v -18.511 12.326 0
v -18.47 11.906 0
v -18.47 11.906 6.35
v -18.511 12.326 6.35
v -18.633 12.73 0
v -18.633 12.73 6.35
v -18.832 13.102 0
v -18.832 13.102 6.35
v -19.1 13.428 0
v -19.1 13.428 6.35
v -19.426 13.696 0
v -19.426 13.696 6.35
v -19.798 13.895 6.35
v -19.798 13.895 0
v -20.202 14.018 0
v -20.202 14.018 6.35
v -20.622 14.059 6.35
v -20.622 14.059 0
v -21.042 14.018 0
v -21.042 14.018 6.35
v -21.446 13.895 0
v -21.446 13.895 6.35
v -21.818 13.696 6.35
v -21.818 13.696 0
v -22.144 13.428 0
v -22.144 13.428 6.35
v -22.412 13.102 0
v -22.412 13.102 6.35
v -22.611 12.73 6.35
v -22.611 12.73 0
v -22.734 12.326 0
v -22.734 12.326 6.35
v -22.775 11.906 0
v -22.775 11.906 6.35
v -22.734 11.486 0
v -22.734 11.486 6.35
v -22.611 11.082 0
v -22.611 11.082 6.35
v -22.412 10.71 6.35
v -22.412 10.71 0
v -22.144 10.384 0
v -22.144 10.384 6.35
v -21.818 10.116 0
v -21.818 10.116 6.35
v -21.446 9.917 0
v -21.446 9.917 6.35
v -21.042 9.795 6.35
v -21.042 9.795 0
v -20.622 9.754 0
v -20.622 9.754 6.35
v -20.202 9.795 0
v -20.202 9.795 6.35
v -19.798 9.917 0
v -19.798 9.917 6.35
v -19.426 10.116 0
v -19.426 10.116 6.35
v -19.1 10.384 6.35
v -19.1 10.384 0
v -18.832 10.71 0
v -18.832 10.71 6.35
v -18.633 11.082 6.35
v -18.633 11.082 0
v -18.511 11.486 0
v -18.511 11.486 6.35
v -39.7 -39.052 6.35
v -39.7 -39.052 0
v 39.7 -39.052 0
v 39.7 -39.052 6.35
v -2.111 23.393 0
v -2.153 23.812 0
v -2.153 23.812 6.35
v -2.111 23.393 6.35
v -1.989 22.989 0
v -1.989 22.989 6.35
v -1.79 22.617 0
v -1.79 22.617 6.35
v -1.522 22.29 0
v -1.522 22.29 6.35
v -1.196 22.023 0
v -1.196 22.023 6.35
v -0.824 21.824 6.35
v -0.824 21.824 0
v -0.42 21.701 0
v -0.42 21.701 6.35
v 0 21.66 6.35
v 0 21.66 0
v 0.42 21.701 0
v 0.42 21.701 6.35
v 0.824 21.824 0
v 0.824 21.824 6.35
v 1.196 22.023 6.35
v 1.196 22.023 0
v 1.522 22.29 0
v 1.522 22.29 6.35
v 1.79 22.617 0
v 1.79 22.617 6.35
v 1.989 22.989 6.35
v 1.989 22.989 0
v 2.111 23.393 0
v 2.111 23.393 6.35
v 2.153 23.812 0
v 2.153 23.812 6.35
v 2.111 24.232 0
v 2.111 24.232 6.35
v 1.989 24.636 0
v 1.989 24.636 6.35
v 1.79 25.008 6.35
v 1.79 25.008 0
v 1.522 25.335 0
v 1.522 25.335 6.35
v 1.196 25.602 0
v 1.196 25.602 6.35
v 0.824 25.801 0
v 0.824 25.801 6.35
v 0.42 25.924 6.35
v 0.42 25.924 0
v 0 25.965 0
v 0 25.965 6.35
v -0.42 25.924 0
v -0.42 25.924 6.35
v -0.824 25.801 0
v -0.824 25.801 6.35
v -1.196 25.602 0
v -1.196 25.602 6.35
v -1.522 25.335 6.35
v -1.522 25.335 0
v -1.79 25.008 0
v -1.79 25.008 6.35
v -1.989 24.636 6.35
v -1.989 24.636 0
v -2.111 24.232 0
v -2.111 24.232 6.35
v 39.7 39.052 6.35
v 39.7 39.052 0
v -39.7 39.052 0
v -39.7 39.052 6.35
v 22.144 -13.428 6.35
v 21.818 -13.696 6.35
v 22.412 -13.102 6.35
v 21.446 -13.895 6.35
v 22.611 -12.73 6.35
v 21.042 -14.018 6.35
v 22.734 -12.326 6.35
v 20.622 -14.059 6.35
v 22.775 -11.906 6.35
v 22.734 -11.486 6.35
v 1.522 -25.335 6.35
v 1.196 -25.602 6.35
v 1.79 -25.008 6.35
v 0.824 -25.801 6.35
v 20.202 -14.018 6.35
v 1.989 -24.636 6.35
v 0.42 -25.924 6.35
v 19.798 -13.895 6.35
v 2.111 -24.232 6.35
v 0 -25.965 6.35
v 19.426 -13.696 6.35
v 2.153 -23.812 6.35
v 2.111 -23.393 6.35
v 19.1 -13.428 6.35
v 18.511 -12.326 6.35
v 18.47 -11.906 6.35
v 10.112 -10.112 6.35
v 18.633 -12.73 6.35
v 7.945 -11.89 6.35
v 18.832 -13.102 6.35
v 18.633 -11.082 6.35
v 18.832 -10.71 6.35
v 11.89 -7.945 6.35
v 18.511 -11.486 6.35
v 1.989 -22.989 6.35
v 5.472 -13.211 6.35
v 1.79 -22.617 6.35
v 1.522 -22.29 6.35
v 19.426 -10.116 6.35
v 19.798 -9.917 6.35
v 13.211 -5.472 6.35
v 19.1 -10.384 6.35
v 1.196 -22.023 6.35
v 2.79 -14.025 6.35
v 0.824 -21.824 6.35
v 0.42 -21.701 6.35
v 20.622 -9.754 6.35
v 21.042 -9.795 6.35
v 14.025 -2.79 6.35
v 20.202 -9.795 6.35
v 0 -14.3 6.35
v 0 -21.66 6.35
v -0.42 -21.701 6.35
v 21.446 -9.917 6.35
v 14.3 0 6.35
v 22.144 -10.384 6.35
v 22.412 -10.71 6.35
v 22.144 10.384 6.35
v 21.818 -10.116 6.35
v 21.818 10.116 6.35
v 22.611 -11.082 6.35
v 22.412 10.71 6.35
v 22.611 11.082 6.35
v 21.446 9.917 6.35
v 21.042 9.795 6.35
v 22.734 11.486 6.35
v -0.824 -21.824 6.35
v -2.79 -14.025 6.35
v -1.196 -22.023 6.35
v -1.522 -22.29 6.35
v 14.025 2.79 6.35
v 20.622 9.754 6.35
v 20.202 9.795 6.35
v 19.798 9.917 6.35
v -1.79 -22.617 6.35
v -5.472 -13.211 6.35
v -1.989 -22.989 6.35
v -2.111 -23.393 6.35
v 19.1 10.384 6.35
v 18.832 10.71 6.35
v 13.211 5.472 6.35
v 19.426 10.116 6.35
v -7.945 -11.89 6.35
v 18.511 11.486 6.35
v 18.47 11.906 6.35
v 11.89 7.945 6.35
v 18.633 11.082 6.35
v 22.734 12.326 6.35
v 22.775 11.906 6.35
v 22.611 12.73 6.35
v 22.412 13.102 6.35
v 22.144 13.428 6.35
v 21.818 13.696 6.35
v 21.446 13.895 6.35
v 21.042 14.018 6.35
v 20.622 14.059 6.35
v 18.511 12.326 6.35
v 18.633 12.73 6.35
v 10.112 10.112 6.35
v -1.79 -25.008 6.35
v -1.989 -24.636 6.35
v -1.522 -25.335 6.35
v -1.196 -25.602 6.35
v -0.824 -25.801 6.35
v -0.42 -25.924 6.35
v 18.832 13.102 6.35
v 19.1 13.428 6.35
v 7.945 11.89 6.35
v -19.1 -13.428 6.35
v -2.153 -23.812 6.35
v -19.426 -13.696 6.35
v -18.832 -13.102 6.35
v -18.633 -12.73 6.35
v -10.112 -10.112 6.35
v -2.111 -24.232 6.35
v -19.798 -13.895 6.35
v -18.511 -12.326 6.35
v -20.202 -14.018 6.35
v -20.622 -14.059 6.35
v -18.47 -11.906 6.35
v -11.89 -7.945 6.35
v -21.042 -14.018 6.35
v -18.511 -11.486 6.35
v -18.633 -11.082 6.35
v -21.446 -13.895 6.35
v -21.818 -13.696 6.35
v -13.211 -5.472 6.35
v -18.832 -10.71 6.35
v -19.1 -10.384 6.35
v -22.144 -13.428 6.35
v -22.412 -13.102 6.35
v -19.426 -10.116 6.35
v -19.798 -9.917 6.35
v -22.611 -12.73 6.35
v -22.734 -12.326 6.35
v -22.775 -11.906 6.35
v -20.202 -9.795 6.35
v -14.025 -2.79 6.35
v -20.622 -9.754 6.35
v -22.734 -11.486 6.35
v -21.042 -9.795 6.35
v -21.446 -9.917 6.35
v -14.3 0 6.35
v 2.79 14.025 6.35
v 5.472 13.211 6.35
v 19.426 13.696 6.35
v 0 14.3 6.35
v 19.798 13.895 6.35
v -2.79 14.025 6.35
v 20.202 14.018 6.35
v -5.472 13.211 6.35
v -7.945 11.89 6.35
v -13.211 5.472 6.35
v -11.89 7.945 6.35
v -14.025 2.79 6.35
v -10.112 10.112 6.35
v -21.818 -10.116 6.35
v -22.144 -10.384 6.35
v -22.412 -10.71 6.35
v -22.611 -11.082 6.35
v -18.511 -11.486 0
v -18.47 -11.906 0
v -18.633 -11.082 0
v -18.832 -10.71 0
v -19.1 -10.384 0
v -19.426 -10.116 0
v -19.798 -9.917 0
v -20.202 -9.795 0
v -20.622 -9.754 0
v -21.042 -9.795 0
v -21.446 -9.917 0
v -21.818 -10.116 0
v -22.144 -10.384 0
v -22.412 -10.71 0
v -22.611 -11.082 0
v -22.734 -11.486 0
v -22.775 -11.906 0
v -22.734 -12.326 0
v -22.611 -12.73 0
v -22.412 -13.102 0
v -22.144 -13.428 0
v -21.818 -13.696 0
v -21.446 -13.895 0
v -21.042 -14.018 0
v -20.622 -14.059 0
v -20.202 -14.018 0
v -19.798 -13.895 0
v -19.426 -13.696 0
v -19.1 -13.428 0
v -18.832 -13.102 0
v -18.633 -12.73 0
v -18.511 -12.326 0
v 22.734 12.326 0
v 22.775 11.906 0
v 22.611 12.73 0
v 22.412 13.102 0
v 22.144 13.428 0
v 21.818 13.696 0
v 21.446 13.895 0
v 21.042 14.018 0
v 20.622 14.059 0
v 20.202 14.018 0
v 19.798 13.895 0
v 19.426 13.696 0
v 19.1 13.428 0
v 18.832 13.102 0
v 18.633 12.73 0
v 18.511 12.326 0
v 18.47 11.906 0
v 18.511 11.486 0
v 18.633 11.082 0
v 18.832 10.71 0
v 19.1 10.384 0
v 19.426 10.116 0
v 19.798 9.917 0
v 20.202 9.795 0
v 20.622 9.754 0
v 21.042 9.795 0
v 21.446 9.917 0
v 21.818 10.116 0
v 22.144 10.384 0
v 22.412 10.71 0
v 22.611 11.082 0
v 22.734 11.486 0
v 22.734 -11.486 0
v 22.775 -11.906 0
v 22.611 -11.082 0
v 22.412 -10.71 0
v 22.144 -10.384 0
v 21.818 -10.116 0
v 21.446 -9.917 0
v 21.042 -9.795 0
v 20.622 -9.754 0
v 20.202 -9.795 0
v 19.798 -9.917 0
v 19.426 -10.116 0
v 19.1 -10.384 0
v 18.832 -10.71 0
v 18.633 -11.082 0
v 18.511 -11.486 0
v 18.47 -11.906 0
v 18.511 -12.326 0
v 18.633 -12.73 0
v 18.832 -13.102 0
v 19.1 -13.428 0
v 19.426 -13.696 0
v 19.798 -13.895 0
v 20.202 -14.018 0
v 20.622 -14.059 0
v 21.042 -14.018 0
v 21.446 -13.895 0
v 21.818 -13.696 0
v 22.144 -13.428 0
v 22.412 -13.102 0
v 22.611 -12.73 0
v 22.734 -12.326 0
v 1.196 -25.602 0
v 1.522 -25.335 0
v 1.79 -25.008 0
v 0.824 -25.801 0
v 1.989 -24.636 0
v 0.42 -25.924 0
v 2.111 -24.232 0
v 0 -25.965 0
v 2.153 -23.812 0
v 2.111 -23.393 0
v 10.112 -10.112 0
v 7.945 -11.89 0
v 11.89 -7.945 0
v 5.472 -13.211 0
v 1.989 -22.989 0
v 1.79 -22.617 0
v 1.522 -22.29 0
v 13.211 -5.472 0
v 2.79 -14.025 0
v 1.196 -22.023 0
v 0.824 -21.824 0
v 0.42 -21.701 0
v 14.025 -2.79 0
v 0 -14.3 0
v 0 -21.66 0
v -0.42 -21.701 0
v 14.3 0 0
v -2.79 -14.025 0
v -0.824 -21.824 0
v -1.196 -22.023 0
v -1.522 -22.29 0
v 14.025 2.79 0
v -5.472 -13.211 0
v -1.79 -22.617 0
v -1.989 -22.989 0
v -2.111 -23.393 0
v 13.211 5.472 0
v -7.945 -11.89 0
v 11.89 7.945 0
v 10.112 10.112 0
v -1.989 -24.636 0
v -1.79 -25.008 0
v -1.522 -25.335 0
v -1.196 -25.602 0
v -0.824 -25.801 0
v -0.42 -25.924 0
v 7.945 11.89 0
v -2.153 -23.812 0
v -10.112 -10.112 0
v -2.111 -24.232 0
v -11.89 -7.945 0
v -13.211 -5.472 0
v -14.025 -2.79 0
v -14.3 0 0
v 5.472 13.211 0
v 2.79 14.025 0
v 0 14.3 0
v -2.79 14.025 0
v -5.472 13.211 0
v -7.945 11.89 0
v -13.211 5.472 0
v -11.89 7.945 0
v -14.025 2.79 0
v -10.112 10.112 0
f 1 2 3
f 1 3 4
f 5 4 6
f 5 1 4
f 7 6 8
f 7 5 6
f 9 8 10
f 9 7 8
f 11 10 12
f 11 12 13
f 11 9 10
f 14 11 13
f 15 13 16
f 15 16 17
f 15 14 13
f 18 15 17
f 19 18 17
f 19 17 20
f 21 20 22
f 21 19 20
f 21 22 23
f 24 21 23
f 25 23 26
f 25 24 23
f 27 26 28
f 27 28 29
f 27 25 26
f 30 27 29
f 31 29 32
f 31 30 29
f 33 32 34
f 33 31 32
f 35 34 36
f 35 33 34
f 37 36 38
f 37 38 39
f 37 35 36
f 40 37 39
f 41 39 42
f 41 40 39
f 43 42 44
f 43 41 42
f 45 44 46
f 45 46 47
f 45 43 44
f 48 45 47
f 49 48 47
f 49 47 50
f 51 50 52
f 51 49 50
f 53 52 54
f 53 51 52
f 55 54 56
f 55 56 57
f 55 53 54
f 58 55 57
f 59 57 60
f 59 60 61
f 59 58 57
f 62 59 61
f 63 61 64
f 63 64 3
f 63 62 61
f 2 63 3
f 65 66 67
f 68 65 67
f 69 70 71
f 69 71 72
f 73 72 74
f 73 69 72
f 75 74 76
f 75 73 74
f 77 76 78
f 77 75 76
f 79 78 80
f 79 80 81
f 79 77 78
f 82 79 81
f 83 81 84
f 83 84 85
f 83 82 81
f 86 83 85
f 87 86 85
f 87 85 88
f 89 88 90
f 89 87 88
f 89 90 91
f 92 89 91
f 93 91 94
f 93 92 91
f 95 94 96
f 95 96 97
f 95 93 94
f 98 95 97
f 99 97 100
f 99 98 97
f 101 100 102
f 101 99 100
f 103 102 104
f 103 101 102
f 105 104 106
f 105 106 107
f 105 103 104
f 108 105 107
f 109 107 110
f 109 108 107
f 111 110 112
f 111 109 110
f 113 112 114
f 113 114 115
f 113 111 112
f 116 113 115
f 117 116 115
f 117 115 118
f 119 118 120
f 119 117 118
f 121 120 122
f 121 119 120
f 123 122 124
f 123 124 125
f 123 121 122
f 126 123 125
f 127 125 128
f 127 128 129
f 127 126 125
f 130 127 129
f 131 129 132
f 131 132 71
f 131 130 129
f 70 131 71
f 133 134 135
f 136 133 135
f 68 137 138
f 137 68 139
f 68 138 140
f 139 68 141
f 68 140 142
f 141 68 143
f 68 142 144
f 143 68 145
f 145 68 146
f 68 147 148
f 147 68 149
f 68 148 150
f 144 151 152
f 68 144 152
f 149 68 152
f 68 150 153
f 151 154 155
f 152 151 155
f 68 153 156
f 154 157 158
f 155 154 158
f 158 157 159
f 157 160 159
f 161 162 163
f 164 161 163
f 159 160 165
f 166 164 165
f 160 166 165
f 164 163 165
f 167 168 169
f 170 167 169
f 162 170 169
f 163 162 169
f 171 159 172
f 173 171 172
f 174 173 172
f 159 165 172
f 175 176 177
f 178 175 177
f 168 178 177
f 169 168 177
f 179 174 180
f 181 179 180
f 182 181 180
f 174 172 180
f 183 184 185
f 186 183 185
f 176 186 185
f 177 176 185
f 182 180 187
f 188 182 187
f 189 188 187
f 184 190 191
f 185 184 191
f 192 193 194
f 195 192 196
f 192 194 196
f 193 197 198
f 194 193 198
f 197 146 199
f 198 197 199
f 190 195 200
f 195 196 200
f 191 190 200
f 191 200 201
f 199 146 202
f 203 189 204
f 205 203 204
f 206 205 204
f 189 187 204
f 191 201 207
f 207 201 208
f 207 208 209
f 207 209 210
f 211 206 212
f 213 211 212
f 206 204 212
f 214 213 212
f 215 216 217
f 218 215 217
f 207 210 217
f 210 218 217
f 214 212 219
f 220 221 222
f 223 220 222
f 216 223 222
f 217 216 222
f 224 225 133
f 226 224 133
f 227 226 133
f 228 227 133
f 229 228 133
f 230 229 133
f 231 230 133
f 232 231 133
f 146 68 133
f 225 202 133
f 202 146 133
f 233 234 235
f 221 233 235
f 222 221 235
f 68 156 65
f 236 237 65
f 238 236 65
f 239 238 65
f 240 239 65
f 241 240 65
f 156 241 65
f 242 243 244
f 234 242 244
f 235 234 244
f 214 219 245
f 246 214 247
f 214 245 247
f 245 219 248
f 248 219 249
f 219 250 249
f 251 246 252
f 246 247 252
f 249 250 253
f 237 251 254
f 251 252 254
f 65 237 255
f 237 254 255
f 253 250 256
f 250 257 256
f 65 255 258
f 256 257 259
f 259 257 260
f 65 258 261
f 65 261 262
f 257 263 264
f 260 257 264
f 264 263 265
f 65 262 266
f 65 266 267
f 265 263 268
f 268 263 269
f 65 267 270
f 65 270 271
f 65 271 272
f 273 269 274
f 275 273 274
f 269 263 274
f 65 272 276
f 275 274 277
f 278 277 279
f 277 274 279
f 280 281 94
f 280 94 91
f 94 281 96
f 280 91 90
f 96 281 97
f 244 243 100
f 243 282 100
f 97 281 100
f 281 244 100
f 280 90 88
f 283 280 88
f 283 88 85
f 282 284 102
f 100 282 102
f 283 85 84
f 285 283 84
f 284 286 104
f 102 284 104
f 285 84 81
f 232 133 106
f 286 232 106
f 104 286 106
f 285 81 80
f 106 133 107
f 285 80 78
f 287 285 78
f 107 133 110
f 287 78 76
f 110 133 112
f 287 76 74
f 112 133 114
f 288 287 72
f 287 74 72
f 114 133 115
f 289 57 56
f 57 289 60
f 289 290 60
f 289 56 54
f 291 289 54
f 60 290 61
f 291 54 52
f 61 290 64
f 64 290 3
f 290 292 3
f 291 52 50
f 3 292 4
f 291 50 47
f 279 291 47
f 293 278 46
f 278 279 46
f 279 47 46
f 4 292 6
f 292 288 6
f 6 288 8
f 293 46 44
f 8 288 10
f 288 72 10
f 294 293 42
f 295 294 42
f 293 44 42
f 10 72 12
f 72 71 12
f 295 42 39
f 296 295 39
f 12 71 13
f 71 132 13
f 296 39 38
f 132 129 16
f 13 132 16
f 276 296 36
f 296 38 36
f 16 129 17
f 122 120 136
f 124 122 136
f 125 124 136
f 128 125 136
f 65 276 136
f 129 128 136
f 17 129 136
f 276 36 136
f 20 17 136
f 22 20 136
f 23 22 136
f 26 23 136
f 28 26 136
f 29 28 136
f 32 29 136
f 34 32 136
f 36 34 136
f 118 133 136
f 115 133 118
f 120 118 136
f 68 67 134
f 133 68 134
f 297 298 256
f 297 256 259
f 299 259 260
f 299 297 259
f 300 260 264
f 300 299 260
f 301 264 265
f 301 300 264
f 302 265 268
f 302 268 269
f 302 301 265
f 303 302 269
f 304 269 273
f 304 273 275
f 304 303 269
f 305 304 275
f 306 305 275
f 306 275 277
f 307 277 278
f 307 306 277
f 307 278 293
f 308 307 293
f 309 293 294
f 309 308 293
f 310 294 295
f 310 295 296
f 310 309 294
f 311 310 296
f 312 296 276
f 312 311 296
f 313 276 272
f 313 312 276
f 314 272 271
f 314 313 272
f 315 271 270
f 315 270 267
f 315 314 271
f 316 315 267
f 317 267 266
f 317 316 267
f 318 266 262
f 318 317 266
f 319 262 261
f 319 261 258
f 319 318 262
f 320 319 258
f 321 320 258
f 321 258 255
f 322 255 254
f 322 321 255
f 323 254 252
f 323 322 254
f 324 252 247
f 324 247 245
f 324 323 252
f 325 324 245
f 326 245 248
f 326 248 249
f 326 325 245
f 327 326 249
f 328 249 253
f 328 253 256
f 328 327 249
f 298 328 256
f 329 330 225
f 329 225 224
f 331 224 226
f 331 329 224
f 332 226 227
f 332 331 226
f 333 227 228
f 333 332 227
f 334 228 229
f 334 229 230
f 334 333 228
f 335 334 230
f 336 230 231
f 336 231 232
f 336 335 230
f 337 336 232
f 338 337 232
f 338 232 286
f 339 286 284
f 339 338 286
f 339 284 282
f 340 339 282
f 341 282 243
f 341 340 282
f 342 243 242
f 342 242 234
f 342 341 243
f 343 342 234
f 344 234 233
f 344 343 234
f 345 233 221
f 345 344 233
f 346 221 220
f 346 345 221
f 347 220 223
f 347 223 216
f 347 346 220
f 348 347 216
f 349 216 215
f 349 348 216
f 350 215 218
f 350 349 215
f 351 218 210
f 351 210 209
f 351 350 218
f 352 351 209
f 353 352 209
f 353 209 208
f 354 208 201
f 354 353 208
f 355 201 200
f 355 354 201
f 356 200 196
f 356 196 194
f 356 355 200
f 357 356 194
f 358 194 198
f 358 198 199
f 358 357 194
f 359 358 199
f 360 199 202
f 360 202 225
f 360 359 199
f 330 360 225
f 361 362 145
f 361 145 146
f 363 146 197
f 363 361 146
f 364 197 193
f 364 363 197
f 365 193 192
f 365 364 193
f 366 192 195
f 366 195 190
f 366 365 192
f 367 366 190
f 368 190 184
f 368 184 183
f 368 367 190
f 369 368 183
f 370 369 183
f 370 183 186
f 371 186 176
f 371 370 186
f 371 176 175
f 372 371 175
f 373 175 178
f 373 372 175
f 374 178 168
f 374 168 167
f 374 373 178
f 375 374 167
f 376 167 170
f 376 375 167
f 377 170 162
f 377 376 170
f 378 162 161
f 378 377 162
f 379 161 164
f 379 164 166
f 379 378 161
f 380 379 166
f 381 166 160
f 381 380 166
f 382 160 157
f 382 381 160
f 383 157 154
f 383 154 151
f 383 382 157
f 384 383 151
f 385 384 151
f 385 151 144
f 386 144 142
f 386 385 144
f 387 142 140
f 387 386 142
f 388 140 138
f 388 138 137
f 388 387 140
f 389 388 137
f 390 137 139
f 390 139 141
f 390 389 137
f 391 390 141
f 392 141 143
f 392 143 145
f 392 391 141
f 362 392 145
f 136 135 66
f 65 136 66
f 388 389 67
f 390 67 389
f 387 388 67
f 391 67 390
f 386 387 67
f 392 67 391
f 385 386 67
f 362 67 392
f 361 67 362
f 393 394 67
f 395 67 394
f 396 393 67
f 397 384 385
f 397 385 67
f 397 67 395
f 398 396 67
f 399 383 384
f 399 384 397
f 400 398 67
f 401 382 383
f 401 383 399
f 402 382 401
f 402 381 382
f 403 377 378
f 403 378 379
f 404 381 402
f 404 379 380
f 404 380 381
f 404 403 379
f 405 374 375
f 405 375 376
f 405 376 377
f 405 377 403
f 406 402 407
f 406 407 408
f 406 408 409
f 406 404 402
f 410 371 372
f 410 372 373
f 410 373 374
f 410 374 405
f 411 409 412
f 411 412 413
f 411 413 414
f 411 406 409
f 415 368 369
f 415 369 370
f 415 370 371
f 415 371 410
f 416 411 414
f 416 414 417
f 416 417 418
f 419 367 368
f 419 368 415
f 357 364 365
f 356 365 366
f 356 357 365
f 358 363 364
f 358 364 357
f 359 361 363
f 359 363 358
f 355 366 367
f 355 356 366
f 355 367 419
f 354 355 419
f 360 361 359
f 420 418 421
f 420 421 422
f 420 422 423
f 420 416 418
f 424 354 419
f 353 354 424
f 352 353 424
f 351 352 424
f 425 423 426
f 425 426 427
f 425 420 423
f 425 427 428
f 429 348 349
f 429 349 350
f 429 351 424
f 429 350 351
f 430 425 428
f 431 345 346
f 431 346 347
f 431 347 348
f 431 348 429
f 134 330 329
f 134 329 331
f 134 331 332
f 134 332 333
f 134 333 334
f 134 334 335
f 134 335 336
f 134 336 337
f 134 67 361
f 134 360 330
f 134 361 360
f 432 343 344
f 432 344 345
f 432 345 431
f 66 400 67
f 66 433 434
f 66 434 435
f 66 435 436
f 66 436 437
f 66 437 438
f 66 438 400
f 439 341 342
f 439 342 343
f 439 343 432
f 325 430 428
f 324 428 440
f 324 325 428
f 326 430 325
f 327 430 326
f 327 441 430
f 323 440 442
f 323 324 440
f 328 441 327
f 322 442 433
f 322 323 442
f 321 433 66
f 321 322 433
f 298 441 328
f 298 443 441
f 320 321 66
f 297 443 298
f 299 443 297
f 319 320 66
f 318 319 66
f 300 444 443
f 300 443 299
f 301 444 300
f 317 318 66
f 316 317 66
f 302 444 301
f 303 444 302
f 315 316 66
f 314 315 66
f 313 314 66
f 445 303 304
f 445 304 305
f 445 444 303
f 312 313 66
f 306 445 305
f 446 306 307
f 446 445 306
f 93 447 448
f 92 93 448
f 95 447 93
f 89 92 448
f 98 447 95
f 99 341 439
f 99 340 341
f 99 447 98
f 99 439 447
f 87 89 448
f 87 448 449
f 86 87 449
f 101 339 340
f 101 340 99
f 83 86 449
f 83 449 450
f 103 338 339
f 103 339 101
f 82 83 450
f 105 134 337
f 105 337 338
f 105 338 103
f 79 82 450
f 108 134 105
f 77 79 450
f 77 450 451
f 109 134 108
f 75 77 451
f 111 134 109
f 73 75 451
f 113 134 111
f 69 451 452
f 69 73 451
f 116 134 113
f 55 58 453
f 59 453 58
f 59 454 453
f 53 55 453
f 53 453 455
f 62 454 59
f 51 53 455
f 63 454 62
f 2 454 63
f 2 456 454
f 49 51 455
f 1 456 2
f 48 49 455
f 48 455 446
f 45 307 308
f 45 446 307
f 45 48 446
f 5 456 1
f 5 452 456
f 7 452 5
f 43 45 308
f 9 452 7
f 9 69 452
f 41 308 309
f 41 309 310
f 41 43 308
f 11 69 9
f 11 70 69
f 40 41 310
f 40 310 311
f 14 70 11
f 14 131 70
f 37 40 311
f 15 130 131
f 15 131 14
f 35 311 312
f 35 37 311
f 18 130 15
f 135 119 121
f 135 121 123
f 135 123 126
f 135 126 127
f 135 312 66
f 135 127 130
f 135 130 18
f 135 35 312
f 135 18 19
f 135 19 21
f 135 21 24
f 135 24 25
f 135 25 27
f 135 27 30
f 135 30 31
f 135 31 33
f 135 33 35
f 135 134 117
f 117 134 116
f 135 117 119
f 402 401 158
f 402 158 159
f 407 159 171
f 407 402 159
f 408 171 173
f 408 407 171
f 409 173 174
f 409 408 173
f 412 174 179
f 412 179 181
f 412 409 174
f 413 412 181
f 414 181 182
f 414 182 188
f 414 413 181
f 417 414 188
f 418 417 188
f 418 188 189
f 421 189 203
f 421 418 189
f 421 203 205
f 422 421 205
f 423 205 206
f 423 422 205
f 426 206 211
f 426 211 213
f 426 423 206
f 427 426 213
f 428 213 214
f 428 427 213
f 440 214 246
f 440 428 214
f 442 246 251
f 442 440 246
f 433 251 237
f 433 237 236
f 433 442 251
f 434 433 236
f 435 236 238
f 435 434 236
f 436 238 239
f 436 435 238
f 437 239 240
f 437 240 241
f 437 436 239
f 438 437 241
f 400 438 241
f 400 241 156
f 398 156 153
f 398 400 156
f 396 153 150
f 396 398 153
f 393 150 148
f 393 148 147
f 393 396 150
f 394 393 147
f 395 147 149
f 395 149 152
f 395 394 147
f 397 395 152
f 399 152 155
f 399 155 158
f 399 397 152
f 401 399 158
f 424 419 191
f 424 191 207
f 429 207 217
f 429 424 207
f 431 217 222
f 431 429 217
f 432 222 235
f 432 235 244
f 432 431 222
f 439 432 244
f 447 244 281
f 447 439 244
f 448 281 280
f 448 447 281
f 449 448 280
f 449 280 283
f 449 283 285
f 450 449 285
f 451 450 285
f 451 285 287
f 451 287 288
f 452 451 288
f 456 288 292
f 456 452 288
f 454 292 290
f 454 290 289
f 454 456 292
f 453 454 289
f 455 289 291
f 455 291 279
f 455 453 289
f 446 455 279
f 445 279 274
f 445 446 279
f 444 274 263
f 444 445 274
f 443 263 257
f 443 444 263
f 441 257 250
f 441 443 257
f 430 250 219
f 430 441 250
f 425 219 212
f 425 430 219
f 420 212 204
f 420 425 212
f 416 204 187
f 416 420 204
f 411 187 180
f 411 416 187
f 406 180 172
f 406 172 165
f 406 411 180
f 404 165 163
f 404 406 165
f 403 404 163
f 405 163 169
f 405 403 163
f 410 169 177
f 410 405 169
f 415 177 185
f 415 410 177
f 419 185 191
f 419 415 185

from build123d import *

# Parameters (mm, degrees)
BOSS_EXTRUDE1_DEPTH = 6.35


with BuildPart() as part:
    # Sketch1 → Boss-Extrude1 (new body)
    with BuildSketch(Plane.XY):
        Polygon((0, 39.0525), (39.7, 39.0525), (39.7, 0), (39.7, -39.0525), (0, -39.0525), (-39.7, -39.0525), (-39.7, 0), (-39.7, 39.0525), align=None)
        with BuildLine():
            ThreePointArc((2.15265, 23.8125), (0, 25.96515), (-2.15265, 23.8125))
            ThreePointArc((-2.15265, 23.8125), (0, 21.65985), (2.15265, 23.8125))
        make_face(mode=Mode.SUBTRACT)
        with BuildLine():
            ThreePointArc((-14.3, 0), (0, -14.3), (14.3, 0))
            ThreePointArc((14.3, 0), (0, 14.3), (-14.3, 0))
        make_face(mode=Mode.SUBTRACT)
        with BuildLine():
            ThreePointArc((-22.774879928, 11.90625), (-20.622229928, 9.7536), (-18.469579928, 11.90625))
            ThreePointArc((-18.469579928, 11.90625), (-20.622229928, 14.0589), (-22.774879928, 11.90625))
        make_face(mode=Mode.SUBTRACT)
        with BuildLine():
            ThreePointArc((-22.774879928, -11.90625), (-20.622229928, -14.0589), (-18.469579928, -11.90625))
            ThreePointArc((-18.469579928, -11.90625), (-20.622229928, -9.7536), (-22.774879928, -11.90625))
        make_face(mode=Mode.SUBTRACT)
        with BuildLine():
            ThreePointArc((-2.15265, -23.8125), (0, -25.96515), (2.15265, -23.8125))
            ThreePointArc((2.15265, -23.8125), (0, -21.65985), (-2.15265, -23.8125))
        make_face(mode=Mode.SUBTRACT)
        with BuildLine():
            ThreePointArc((18.469579928, 11.90625), (20.622229928, 9.7536), (22.774879928, 11.90625))
            ThreePointArc((22.774879928, 11.90625), (20.622229928, 14.0589), (18.469579928, 11.90625))
        make_face(mode=Mode.SUBTRACT)
        with BuildLine():
            ThreePointArc((18.469579928, -11.90625), (20.622229928, -14.0589), (22.774879928, -11.90625))
            ThreePointArc((22.774879928, -11.90625), (20.622229928, -9.7536), (18.469579928, -11.90625))
        make_face(mode=Mode.SUBTRACT)
    extrude(amount=BOSS_EXTRUDE1_DEPTH)


solid = part.part
